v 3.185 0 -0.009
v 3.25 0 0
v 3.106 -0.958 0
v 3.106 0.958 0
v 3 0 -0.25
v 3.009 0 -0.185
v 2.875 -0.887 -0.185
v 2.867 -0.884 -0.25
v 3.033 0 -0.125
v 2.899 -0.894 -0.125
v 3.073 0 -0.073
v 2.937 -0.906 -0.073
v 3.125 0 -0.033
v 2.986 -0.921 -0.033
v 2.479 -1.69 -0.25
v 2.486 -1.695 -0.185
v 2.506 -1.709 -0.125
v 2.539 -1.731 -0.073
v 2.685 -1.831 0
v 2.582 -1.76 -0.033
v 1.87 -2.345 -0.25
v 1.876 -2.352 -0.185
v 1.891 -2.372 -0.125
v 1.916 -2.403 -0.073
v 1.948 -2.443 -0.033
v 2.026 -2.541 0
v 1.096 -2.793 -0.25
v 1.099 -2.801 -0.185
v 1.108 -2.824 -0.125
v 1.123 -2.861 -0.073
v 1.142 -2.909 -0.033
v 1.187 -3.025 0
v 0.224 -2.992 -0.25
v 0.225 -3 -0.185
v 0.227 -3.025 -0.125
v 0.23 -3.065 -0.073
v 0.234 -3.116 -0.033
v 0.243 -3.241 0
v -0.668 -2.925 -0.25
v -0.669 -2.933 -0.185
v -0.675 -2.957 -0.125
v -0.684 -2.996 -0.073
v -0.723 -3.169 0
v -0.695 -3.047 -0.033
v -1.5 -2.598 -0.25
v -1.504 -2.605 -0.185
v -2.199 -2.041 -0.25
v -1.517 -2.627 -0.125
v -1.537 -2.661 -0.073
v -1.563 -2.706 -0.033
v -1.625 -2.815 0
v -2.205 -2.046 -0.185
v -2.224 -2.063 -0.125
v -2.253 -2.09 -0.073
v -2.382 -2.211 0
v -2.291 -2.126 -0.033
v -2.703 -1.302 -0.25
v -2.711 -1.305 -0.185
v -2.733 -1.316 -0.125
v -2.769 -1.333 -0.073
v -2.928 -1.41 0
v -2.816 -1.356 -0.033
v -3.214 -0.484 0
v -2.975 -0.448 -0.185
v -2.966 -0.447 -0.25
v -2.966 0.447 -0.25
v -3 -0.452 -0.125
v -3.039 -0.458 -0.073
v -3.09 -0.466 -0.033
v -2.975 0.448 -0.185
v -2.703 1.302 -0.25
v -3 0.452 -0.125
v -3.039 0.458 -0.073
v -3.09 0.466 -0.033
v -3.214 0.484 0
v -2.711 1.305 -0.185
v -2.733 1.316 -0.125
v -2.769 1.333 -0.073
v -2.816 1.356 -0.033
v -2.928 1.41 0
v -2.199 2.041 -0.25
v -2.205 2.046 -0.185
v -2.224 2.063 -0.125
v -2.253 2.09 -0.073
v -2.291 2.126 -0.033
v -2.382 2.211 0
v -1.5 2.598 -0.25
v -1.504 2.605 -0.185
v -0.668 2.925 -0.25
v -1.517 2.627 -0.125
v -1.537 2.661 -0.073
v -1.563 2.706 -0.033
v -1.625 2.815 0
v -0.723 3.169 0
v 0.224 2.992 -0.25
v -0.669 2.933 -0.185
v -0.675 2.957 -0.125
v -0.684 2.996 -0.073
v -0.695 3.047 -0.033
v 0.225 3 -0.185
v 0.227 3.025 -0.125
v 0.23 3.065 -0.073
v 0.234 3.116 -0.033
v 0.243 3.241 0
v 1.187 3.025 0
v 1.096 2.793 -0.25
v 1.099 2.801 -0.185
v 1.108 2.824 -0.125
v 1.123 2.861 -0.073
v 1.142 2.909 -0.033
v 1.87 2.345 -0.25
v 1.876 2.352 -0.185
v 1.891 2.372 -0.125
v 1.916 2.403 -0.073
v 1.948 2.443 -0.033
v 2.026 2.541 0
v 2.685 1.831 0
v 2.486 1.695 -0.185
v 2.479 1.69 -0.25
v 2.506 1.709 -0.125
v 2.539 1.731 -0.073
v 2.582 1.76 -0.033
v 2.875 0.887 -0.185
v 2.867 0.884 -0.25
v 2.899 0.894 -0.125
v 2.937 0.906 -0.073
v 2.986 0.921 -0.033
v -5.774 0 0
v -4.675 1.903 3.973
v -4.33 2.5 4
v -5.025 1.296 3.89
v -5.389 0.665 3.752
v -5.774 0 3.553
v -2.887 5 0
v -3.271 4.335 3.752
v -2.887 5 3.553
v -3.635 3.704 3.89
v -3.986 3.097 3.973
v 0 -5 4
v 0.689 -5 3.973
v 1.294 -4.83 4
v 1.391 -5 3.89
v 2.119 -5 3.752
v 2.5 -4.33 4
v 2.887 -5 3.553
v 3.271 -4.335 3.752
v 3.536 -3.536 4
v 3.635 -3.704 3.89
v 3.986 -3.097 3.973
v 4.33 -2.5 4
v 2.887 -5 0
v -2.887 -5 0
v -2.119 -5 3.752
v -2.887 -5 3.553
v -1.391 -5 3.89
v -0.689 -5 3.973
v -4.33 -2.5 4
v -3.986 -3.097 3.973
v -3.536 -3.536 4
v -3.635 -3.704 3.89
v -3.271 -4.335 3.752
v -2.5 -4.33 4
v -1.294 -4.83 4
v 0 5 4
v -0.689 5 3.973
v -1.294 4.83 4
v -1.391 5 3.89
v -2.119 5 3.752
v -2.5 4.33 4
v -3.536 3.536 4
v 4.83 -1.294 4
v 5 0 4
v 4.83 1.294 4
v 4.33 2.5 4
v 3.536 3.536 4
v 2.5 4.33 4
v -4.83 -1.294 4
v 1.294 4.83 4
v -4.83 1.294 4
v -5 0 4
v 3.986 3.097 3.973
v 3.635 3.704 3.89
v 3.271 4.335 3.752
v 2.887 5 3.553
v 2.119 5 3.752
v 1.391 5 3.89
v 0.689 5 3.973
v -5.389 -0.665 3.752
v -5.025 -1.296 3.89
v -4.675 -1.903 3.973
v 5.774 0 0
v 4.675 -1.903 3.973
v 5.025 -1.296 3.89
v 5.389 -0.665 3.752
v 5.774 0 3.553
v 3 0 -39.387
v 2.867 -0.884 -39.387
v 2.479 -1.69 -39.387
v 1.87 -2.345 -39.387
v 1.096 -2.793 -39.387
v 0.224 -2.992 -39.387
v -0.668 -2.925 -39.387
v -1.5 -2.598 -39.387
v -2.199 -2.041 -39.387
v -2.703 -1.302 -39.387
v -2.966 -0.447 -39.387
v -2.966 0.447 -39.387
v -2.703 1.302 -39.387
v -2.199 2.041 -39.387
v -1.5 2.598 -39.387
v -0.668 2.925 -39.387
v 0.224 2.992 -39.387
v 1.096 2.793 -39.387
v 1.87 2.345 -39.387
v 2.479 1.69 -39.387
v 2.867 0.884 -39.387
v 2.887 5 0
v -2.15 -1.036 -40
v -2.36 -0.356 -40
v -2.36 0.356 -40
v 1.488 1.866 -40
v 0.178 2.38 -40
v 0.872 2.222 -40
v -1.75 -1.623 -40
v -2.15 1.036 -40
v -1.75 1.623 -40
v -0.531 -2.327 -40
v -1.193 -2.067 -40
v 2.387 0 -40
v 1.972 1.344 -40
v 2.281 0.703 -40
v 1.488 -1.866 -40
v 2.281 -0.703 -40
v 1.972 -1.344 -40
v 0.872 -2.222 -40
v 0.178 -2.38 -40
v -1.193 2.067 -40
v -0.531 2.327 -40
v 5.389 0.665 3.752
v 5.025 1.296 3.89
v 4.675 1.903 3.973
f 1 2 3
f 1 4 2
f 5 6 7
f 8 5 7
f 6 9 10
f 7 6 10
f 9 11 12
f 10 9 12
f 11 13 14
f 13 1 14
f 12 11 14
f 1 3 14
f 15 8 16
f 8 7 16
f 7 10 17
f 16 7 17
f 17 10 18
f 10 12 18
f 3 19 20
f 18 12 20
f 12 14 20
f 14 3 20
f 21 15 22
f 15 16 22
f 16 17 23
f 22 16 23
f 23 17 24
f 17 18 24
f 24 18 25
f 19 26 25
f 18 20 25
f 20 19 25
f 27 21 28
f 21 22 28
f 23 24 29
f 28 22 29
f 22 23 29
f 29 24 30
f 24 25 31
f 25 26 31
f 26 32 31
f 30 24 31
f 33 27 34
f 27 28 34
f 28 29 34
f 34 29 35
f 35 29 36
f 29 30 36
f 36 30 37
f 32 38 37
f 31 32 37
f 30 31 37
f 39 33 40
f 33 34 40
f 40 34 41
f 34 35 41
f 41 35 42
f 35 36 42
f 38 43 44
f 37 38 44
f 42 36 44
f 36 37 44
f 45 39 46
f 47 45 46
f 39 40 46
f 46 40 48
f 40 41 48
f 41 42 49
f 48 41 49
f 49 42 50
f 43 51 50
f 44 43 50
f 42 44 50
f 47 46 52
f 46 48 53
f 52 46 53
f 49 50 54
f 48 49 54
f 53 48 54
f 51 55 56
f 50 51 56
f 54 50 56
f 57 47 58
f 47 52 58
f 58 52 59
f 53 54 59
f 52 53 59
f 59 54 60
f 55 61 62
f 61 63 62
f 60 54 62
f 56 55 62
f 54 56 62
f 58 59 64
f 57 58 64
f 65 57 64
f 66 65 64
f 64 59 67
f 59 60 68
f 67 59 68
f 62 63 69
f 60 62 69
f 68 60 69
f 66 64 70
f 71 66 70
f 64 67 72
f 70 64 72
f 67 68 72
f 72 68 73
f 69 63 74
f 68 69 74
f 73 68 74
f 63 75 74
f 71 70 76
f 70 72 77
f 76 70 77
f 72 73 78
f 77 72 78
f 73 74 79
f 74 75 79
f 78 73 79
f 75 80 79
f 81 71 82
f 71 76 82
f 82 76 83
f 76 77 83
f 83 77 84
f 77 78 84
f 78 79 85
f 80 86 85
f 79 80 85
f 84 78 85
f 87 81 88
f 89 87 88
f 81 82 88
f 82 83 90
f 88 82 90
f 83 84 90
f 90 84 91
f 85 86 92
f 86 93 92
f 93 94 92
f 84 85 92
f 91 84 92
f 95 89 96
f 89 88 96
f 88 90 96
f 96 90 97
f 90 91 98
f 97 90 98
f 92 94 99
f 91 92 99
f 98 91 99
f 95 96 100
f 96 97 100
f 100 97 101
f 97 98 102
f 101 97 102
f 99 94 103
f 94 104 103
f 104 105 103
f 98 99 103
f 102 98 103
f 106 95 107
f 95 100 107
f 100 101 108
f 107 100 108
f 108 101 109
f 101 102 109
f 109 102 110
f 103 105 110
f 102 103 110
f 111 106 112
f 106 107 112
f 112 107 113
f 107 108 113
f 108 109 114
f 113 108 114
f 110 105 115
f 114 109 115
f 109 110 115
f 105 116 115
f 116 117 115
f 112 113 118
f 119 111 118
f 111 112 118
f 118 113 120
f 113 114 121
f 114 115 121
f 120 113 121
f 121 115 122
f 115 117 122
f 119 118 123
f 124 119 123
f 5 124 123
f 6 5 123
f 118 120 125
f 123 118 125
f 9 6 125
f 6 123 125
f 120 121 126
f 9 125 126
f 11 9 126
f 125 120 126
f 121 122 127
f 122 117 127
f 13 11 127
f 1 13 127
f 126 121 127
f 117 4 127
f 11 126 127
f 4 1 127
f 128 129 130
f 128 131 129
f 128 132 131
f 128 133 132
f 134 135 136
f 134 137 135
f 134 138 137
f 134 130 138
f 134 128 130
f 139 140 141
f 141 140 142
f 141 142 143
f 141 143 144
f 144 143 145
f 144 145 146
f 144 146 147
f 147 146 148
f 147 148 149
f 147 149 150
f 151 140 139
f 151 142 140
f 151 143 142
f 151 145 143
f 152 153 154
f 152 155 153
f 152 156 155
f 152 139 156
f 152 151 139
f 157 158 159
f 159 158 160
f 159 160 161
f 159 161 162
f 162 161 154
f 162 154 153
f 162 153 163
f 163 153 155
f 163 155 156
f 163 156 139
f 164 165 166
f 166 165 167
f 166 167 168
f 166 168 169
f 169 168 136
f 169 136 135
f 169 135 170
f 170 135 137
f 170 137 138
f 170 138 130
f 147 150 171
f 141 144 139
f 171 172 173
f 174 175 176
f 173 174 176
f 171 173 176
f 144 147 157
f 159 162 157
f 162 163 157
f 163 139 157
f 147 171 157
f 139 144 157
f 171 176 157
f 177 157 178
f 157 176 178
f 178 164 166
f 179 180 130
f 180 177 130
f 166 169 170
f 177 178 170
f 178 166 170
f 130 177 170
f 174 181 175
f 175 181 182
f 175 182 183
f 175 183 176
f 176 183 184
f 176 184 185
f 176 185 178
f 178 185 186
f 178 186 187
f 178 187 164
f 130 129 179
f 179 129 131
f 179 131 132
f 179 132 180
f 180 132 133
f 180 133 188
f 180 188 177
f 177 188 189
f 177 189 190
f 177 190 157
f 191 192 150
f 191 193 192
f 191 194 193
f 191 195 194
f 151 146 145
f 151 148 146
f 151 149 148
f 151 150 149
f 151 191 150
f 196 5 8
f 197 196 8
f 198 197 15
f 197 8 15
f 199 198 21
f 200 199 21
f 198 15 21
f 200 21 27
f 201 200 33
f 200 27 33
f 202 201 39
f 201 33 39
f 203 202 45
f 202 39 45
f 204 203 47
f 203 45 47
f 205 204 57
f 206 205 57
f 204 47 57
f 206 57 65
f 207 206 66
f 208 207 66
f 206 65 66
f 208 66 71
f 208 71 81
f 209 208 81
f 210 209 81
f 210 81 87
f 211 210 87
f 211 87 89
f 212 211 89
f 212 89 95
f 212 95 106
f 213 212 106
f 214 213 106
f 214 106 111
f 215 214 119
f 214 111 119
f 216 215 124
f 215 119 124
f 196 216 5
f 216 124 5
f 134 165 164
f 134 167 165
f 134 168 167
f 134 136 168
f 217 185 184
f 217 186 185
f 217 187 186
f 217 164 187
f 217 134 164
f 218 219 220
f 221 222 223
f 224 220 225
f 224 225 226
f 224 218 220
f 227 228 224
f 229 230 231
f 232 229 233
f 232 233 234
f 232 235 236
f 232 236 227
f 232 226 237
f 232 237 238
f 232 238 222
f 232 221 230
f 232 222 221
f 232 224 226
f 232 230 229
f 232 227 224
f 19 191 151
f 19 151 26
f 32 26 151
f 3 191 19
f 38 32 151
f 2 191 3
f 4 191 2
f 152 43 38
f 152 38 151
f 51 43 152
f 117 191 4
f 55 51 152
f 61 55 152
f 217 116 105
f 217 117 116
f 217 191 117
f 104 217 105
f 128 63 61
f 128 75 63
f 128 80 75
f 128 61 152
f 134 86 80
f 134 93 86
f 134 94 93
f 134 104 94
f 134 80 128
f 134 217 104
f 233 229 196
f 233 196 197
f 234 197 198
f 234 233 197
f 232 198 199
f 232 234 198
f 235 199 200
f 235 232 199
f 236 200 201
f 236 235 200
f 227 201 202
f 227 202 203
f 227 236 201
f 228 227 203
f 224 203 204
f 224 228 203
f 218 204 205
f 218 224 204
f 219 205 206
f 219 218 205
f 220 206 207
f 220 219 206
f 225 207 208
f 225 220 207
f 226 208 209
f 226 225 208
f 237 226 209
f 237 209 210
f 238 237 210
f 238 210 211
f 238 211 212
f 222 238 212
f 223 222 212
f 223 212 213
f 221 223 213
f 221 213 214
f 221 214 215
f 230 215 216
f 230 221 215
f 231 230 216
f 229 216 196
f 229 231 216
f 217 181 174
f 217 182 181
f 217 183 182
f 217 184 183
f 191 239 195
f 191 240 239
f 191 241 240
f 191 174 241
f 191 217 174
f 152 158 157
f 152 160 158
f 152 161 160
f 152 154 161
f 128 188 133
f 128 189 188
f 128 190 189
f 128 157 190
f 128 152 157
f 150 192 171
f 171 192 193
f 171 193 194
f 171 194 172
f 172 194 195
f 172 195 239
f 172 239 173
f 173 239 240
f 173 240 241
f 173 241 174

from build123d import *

# Parameters (mm, degrees)
BASE_EXTRUDE_DEPTH  = 4
SKETCH3_R           = 3
BOSS_EXTRUDE1_DEPTH = 40
CHAMFER1_SIZE       = 0.6134
FILLET1_R           = 0.25


with BuildPart() as part:
    # Sketch1 → Base-Extrude (new body)
    with BuildSketch(Plane.XY):
        Polygon((-2.886751346, 5), (2.886751346, 5), (5.773502692, 0), (2.886751346, -5), (-2.886751346, -5), (-5.773502692, 0), align=None)
    extrude(amount=BASE_EXTRUDE_DEPTH)

    # Sketch5 → Cut-Revolve1 (revolve, cut)
    with BuildSketch(Plane(origin=(0, 0, 0), x_dir=(1, 0, 0), z_dir=(0, 1, 0))):
        Polygon((-5.773502692, -4), (-5, -4), (-5.773502692, -3.553418013), align=None)
    revolve(axis=Axis((0, 0, 0), (0, 0, 1)), mode=Mode.SUBTRACT)

    # Sketch3 → Boss-Extrude1 (add)
    with BuildSketch(Plane(origin=(0, 0, 0), x_dir=(-1, 0, 0), z_dir=(0, 0, -1))):
        with Locations(Location((0, 0, 0), (0, 0, 180))):
            Circle(SKETCH3_R)
    extrude(amount=BOSS_EXTRUDE1_DEPTH)

    # Chamfer1
    chamfer1_edges = [part.edges().sort_by_distance(p)[0] for p in [
        (-3, 0, -40),
    ]]
    chamfer(chamfer1_edges, length=CHAMFER1_SIZE)

    # Fillet1
    fillet1_edges = [part.edges().sort_by_distance(p)[0] for p in [
        (-3, 0, 0),
    ]]
    fillet(fillet1_edges, radius=FILLET1_R)


solid = part.part
